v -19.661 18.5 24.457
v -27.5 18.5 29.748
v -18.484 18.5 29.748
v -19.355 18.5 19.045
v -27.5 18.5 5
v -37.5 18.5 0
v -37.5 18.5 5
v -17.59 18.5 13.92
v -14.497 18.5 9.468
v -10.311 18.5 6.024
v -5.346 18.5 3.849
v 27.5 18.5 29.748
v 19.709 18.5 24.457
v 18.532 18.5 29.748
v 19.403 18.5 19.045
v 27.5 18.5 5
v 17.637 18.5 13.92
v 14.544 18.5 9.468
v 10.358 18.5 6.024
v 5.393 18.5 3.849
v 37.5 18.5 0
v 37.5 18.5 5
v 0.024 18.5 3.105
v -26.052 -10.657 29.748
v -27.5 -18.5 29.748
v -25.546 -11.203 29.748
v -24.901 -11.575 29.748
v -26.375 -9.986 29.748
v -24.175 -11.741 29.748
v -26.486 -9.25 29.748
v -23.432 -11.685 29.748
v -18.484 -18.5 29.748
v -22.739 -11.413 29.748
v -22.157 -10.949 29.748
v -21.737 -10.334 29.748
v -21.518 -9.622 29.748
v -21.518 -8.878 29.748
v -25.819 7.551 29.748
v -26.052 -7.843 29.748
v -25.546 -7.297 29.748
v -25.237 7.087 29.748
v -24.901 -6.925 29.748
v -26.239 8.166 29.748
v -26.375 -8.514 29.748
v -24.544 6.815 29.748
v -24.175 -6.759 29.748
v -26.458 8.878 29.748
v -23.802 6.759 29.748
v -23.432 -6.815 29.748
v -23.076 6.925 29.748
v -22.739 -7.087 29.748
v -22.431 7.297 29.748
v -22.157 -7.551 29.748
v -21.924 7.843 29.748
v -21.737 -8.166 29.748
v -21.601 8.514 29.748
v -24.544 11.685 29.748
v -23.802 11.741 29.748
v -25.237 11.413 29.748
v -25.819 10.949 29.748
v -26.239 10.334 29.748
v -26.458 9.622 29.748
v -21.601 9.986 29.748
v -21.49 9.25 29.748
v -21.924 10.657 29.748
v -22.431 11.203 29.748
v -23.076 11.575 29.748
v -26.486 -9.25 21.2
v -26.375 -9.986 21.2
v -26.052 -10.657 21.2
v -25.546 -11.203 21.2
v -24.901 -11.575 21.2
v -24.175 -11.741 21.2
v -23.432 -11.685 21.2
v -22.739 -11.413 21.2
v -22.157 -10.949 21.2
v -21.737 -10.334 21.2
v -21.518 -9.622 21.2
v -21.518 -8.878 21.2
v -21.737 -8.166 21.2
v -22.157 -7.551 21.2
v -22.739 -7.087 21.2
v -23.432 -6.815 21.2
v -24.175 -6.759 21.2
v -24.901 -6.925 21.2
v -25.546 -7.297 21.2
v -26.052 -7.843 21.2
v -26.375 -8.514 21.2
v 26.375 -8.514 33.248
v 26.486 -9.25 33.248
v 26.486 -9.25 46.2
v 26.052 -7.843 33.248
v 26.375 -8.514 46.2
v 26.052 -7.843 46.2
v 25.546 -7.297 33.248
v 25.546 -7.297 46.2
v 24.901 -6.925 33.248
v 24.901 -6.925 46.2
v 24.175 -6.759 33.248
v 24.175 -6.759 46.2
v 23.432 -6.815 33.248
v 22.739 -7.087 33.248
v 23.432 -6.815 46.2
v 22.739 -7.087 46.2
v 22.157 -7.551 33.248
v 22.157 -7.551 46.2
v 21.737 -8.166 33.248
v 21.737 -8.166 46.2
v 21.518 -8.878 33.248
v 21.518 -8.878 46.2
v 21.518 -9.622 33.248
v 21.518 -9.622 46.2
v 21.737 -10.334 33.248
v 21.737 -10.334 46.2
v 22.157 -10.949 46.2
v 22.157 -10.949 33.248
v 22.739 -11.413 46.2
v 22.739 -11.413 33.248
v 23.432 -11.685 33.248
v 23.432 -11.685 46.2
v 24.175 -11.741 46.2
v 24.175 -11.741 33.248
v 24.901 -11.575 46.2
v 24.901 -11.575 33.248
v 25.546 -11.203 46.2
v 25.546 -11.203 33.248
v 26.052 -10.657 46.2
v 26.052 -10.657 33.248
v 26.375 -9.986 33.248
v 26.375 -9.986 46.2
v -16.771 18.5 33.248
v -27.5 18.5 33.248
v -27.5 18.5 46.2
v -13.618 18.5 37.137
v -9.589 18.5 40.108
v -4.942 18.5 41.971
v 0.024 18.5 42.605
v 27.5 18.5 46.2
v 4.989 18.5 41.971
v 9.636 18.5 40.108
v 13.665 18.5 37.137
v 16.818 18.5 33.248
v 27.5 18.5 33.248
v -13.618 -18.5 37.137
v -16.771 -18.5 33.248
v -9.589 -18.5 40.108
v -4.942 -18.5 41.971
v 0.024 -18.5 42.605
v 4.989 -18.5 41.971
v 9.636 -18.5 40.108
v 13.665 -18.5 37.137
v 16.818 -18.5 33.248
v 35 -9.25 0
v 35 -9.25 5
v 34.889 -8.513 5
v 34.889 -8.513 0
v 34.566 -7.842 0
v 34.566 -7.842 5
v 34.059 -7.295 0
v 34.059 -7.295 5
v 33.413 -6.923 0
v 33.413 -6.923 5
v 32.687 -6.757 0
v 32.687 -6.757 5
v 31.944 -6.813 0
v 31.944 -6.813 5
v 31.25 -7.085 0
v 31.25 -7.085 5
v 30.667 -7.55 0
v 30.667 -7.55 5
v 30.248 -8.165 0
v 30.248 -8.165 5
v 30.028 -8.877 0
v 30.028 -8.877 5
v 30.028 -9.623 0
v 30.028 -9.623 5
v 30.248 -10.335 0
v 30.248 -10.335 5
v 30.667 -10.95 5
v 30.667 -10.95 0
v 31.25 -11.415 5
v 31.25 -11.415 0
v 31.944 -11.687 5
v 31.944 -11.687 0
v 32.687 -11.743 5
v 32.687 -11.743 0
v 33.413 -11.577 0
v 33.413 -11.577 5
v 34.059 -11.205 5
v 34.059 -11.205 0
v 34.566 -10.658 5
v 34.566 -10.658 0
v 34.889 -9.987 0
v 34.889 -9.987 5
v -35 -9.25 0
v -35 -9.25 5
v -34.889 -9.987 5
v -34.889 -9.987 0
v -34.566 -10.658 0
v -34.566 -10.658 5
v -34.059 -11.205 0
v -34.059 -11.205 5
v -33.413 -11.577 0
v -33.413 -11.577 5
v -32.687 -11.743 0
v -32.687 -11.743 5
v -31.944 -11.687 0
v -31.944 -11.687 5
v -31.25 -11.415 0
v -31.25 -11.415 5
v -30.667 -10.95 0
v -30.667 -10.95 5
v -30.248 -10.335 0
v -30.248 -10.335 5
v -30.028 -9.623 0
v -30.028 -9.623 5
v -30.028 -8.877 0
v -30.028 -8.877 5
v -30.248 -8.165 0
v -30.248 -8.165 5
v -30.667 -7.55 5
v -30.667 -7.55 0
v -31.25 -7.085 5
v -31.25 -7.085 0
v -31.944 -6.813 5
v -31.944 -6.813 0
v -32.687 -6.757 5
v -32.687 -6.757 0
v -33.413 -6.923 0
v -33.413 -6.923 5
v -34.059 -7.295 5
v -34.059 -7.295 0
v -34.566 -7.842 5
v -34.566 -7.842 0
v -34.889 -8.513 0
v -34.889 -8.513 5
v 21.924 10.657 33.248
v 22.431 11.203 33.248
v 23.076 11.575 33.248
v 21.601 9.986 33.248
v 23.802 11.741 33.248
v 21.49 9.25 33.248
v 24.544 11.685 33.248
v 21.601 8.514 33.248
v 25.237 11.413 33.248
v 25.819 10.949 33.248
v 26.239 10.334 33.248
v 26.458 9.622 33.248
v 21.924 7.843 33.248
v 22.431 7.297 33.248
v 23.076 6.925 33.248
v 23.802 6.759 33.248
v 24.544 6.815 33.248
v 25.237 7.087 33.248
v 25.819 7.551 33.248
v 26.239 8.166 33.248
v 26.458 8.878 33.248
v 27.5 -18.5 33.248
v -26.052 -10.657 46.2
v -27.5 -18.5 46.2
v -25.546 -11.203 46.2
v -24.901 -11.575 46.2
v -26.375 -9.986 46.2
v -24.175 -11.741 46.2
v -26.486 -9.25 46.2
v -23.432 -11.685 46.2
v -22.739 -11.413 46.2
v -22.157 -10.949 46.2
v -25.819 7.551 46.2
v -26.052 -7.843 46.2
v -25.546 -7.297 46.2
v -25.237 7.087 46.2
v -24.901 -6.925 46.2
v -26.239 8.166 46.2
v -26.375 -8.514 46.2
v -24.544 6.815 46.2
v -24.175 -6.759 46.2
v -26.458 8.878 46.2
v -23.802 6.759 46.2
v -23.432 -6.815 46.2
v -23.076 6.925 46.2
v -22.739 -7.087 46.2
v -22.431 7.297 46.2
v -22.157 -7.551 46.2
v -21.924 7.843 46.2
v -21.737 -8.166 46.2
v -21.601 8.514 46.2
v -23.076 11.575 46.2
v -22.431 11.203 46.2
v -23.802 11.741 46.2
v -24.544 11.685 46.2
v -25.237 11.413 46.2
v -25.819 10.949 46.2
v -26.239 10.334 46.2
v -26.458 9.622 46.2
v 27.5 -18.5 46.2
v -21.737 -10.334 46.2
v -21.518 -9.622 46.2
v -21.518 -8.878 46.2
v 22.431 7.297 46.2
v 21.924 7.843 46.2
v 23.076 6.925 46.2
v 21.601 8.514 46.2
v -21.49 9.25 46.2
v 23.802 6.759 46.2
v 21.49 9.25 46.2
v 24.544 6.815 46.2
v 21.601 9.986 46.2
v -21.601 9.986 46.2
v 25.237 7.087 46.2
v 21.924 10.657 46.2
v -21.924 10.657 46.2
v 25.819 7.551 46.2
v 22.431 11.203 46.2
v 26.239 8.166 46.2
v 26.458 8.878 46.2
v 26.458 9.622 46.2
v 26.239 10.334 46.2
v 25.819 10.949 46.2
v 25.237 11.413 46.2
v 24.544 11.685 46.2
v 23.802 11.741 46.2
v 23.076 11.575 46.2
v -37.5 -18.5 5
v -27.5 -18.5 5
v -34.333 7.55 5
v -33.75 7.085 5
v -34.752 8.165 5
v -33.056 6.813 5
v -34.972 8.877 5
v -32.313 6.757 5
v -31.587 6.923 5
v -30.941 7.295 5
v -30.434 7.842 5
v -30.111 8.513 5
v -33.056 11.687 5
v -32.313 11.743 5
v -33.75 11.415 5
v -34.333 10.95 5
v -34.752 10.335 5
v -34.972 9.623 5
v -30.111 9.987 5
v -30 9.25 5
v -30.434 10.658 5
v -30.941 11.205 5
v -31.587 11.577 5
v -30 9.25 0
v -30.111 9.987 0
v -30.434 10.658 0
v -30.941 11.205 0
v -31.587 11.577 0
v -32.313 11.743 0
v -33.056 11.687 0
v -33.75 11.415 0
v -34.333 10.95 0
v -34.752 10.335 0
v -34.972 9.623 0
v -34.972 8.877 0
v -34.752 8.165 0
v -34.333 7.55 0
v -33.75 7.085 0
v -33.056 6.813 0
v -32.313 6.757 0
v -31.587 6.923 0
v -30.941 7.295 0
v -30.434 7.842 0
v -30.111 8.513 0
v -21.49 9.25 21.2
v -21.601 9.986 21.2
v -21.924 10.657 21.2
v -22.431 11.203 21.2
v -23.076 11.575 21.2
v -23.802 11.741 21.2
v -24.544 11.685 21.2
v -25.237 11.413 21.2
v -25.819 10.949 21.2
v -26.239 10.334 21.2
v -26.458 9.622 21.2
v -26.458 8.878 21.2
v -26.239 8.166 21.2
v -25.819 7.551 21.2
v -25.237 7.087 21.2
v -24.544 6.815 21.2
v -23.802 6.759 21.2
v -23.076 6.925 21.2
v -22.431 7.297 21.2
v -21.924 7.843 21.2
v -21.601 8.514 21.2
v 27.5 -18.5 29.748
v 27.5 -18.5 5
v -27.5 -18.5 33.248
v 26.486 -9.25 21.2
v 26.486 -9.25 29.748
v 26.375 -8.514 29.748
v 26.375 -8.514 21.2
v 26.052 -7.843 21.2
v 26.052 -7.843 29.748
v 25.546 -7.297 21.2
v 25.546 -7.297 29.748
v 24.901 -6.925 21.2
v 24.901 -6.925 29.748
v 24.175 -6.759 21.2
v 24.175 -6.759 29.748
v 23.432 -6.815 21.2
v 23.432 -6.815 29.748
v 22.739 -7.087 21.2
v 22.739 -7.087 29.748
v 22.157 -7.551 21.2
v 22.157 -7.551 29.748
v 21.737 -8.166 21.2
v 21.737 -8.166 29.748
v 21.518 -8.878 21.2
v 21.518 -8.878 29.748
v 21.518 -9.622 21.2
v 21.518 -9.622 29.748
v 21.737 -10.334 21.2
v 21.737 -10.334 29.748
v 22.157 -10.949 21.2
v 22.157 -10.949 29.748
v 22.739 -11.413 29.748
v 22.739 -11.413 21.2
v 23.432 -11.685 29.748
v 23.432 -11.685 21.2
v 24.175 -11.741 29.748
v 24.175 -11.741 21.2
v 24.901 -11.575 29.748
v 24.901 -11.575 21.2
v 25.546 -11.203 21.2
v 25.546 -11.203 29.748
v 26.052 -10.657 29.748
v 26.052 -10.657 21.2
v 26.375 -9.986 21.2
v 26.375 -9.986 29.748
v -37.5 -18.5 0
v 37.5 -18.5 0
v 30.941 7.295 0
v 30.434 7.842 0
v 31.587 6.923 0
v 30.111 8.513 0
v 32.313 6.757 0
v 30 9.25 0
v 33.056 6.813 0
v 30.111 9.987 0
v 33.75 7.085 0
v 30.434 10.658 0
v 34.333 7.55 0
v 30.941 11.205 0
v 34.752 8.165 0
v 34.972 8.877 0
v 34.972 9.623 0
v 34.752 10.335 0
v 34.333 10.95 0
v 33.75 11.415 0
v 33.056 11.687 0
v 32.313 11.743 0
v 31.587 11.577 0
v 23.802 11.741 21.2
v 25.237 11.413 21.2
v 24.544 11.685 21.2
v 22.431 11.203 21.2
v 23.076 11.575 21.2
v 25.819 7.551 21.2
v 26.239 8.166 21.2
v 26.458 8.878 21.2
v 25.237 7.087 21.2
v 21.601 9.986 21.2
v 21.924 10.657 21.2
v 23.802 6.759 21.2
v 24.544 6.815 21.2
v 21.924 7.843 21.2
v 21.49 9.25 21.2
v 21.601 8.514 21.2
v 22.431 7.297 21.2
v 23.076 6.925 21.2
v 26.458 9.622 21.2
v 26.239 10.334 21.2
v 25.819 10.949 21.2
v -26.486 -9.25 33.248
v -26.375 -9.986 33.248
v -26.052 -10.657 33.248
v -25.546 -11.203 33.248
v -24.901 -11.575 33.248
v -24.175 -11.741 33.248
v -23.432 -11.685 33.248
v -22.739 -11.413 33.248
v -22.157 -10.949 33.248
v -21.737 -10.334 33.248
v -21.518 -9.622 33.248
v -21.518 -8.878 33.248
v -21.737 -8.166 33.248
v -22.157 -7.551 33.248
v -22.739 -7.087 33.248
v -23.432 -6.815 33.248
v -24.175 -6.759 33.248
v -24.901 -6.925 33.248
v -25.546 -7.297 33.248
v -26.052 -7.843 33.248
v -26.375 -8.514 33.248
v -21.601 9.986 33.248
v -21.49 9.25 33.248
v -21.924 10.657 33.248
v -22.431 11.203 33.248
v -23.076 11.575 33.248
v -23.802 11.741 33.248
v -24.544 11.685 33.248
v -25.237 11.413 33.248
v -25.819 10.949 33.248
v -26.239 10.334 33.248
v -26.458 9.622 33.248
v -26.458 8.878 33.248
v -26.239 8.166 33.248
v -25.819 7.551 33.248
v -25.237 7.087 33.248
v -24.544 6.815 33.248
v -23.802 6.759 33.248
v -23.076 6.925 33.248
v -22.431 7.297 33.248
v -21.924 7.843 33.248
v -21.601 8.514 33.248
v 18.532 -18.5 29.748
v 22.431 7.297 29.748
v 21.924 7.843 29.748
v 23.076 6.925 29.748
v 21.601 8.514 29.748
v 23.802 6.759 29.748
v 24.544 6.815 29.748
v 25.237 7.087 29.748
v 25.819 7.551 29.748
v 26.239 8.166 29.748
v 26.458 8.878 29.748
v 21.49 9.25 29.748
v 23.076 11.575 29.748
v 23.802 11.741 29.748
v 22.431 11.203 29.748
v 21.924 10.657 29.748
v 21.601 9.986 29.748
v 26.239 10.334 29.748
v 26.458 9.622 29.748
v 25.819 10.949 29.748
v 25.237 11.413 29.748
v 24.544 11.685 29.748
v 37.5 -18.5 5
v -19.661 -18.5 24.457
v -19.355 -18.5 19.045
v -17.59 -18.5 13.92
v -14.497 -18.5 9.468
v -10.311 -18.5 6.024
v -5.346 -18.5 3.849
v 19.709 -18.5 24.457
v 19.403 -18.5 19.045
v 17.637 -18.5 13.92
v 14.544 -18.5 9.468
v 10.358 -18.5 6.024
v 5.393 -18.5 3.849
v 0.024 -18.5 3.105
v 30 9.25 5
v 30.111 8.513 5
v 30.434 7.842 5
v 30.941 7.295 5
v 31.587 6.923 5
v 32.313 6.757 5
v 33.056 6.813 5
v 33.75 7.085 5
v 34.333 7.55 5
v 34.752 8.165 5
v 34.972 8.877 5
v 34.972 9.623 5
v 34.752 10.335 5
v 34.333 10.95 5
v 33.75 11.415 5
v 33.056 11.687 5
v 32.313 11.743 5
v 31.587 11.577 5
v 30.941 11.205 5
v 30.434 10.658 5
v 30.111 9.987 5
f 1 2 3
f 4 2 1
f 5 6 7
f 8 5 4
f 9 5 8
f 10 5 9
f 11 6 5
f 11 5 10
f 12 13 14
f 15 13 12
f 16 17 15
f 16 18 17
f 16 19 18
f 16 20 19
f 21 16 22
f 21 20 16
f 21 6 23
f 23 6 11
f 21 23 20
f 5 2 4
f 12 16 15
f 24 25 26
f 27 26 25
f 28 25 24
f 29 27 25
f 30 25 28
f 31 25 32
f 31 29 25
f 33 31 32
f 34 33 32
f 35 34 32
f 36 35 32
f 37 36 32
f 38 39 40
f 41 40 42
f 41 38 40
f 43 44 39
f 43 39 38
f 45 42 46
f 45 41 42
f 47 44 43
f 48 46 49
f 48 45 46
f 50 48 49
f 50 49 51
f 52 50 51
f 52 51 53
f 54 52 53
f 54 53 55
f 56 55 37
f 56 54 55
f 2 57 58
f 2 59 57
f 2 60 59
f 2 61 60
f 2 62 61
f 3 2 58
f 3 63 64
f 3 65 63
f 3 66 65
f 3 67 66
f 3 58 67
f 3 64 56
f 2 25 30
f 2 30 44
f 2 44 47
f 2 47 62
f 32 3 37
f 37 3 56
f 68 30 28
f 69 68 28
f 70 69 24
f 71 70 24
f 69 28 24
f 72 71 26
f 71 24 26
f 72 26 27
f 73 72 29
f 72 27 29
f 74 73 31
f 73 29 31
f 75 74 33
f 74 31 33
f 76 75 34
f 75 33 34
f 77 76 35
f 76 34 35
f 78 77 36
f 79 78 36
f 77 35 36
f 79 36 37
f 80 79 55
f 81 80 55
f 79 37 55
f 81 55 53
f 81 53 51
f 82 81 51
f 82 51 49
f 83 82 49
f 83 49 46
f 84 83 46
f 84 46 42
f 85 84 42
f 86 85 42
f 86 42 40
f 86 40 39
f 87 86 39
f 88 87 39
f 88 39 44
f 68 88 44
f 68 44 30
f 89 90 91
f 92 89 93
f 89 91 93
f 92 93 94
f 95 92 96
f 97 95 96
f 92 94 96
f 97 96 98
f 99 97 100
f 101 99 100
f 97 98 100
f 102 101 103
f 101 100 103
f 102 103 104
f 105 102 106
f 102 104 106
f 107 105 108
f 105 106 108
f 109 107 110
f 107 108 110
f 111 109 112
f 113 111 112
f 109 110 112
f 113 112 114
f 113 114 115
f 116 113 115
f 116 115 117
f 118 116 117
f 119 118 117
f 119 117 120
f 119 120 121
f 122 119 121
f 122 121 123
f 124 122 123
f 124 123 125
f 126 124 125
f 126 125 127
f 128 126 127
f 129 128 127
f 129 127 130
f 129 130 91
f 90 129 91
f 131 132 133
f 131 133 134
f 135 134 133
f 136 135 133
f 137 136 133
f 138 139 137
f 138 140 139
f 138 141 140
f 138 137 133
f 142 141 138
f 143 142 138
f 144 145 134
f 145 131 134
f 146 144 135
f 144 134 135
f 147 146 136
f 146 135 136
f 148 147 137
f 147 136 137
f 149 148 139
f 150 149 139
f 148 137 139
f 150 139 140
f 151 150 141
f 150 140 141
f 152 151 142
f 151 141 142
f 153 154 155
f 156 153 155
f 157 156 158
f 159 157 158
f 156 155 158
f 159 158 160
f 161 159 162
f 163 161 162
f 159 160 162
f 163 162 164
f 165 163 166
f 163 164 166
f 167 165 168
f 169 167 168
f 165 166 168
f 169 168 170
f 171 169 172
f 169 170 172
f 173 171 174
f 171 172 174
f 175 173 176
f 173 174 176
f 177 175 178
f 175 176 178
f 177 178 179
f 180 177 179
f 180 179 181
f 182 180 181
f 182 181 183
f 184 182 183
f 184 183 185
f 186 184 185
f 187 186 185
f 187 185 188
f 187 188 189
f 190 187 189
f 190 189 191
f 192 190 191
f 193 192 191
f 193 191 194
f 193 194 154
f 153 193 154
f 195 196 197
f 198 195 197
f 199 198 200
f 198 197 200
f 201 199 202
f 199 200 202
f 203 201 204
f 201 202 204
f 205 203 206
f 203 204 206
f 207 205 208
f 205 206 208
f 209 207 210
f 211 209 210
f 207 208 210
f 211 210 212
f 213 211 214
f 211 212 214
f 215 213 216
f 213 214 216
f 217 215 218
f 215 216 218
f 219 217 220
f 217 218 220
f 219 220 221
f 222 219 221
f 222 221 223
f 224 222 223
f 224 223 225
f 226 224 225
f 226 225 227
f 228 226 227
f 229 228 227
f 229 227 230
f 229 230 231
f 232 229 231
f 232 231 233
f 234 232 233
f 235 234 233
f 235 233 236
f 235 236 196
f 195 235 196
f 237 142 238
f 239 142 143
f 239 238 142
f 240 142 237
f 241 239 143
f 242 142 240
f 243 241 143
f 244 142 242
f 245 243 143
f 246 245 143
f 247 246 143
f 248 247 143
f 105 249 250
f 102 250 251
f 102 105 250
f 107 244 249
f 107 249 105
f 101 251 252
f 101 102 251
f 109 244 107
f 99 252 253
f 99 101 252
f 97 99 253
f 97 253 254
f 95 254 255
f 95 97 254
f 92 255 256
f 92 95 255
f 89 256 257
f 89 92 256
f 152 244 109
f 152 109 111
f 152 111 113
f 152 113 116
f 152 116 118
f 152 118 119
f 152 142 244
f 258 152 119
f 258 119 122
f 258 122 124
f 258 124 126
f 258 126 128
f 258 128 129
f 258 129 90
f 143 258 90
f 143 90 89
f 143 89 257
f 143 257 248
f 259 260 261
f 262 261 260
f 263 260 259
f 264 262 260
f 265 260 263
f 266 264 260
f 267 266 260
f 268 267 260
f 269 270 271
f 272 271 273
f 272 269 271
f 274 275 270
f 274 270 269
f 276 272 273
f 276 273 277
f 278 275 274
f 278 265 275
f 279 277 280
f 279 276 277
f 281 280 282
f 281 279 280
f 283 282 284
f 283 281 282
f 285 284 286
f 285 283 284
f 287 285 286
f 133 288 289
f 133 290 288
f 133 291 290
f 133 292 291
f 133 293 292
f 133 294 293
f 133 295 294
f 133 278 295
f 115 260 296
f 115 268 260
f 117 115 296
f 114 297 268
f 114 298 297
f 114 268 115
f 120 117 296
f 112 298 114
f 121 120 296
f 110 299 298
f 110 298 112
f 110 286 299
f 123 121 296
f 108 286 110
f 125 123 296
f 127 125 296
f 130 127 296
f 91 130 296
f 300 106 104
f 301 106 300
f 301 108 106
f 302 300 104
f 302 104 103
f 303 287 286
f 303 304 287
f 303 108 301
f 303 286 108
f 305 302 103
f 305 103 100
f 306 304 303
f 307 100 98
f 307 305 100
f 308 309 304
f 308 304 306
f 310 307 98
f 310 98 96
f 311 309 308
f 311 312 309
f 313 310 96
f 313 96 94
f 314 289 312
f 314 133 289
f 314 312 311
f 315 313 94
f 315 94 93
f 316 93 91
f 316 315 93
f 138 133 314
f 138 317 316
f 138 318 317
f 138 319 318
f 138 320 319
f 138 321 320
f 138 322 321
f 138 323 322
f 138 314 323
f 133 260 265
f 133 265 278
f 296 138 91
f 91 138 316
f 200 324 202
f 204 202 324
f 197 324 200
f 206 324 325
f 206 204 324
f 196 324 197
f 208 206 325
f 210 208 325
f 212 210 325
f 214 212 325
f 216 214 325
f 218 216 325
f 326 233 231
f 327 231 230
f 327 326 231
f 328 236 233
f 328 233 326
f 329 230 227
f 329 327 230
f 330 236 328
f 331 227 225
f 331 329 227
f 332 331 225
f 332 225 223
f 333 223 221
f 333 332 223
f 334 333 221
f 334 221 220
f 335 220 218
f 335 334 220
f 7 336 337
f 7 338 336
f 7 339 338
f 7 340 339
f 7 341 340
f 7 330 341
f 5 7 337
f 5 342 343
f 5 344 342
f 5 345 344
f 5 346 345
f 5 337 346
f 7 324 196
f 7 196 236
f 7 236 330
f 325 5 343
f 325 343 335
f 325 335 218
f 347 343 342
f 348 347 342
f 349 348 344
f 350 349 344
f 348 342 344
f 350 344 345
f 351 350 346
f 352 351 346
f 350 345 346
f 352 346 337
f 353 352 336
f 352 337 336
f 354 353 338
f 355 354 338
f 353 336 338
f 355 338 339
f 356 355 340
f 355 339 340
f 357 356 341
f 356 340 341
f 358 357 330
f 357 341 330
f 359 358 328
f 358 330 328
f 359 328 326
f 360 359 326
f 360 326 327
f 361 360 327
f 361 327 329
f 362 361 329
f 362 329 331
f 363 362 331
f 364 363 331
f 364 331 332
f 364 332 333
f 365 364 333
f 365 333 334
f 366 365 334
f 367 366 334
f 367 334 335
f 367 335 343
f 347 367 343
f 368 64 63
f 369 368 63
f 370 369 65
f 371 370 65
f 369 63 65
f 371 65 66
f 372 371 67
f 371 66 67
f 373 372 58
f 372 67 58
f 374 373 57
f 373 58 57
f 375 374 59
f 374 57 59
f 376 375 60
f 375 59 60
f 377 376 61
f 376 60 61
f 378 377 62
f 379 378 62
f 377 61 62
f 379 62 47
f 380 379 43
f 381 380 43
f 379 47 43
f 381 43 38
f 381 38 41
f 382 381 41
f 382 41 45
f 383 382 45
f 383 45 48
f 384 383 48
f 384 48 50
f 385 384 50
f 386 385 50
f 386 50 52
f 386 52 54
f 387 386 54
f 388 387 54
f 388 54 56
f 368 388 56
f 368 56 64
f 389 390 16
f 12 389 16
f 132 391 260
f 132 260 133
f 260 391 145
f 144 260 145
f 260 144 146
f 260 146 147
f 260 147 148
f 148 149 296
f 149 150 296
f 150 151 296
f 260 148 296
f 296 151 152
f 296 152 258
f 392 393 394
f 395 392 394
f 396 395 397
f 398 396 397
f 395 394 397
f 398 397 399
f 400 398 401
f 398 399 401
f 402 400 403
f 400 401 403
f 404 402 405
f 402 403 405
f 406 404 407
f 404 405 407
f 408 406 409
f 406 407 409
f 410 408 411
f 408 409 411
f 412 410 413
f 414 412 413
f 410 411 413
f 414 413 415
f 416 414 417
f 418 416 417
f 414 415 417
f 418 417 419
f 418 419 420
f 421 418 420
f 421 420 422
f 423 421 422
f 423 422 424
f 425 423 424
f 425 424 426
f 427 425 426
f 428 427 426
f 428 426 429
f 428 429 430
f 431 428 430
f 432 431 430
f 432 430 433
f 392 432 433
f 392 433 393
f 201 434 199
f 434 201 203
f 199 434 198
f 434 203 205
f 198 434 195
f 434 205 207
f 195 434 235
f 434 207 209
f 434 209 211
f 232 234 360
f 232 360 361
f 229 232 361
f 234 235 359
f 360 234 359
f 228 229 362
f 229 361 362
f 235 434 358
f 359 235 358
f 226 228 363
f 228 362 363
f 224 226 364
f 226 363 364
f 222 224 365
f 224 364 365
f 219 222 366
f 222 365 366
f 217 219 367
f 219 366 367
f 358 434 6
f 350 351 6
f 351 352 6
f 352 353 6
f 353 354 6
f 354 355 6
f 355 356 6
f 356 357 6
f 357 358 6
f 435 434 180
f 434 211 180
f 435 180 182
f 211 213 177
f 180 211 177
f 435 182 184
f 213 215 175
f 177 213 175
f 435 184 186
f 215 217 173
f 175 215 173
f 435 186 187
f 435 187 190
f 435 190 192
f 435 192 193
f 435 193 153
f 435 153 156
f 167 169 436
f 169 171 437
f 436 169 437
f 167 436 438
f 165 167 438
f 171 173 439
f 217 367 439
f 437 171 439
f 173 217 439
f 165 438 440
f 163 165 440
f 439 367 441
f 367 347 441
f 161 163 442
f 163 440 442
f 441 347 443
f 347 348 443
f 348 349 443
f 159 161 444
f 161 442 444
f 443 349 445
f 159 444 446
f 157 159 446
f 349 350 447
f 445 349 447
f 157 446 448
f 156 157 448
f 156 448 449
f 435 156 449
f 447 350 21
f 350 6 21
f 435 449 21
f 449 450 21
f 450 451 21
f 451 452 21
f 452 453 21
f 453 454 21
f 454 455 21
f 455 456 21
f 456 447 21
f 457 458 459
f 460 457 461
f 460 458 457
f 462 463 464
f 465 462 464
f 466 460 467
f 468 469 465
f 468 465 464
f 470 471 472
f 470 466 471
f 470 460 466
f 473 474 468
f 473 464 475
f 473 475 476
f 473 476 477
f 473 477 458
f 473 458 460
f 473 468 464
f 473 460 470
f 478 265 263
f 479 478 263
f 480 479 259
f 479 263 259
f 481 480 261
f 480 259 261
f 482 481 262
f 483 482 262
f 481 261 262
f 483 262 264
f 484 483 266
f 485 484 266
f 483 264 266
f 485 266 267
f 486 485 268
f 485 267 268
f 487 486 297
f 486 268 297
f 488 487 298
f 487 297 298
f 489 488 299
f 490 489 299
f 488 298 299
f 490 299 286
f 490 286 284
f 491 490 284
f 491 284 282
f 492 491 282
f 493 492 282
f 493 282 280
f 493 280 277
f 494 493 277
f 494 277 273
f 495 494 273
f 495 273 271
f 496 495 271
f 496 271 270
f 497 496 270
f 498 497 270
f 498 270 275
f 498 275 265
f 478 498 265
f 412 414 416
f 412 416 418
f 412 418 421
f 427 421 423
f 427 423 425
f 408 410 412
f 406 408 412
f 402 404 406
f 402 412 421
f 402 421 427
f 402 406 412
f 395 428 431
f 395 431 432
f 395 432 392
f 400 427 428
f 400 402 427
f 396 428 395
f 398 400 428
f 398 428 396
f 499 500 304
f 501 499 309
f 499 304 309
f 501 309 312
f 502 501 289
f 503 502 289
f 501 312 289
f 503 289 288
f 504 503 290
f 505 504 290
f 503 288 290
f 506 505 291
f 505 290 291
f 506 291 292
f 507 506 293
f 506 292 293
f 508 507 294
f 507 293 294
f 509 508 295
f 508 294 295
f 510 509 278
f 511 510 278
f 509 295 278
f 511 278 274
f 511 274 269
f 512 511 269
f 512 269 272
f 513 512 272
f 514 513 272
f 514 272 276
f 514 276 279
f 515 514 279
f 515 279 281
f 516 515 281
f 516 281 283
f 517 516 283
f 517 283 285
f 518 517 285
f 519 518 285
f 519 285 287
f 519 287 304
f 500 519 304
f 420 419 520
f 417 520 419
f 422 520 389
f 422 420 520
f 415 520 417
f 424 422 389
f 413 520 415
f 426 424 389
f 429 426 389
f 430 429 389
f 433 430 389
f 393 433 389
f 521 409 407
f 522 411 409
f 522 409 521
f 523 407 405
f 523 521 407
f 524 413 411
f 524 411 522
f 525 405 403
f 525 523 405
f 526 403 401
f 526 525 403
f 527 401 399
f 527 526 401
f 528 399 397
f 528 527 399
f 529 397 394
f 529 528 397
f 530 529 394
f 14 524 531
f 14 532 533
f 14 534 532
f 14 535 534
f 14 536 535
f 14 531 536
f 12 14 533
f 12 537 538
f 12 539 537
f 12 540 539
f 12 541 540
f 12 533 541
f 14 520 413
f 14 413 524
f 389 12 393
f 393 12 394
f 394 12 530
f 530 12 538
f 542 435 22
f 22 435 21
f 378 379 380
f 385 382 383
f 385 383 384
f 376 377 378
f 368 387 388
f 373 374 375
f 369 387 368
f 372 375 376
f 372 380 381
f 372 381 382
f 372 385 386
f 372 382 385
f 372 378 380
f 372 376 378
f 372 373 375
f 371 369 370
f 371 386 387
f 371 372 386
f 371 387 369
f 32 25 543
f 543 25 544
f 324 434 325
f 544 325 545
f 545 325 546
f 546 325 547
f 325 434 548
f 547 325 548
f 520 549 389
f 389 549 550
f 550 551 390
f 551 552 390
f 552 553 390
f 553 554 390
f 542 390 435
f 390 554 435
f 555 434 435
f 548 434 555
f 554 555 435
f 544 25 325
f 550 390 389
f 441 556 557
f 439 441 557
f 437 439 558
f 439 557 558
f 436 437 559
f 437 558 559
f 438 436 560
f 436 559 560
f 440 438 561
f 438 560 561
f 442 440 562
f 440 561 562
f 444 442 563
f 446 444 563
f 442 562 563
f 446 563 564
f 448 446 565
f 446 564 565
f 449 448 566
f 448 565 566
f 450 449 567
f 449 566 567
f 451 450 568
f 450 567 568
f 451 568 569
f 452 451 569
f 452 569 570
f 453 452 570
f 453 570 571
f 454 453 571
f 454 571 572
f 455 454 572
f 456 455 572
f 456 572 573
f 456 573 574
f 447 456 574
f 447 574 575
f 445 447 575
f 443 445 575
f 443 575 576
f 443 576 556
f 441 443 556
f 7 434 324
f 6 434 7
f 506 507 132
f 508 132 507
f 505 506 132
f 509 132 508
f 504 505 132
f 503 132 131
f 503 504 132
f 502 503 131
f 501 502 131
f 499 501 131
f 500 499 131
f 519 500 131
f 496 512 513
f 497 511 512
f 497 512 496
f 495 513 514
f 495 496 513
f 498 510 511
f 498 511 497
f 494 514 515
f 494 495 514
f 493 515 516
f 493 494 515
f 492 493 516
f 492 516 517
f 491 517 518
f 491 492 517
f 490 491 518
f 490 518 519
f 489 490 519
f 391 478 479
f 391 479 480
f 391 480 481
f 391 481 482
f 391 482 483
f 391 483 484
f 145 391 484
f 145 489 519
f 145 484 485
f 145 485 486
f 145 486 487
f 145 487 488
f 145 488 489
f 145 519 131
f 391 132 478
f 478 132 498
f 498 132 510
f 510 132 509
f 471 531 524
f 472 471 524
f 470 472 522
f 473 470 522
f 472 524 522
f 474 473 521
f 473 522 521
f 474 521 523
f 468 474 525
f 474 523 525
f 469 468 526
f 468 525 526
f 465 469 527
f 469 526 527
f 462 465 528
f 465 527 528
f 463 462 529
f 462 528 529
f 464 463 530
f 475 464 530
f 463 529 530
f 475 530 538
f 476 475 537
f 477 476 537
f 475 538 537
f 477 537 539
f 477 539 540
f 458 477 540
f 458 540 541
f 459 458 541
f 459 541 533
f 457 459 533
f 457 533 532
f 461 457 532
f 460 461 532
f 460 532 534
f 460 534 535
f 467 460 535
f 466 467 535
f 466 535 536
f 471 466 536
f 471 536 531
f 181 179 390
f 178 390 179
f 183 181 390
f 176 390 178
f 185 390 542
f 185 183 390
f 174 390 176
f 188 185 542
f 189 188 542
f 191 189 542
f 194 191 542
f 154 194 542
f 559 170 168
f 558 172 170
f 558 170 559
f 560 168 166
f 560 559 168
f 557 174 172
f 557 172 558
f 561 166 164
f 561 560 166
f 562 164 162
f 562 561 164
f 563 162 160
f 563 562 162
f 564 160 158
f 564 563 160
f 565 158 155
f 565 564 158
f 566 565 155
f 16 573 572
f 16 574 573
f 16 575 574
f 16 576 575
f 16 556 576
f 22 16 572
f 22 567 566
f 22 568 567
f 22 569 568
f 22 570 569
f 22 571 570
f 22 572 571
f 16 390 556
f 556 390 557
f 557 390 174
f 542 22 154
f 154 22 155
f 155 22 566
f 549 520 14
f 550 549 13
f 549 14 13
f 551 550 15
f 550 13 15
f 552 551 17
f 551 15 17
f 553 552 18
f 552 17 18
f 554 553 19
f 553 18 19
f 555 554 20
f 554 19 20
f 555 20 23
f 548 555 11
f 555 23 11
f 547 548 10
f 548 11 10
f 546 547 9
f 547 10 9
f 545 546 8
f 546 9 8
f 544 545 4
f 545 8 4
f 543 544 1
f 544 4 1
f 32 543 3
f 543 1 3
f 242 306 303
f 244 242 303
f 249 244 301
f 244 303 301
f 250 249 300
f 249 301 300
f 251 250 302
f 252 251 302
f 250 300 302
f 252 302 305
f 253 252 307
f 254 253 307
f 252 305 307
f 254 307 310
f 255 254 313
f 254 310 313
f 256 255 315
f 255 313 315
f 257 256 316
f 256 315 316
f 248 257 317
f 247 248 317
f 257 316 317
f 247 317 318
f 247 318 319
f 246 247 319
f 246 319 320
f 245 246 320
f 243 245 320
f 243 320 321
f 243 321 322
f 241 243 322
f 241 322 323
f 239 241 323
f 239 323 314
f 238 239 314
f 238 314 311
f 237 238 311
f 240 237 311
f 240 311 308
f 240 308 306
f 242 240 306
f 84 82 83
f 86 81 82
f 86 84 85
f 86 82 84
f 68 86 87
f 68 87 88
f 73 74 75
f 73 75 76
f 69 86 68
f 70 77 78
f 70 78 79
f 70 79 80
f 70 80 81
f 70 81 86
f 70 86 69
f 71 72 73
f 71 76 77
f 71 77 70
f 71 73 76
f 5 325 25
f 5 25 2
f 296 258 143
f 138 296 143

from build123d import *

# Parameters (mm, degrees)
SKETCH1_W              = 75
SKETCH1_H              = 37
BOSS_EXTRUDE1_DEPTH    = 5
SKETCH19_W             = 55
SKETCH19_H             = 37
BOSS_EXTRUDE5_DEPTH    = 41.2
SKETCH20_R             = 19.75
CUT_EXTRUDE7_DEPTH     = 71.069180101
SKETCH22_R             = 2.498129319
CUT_EXTRUDE8_DEPTH     = 25
SPLIT1_SURFACE_1_BACK  = 96.543
SPLIT1_SURFACE_1_DEPTH = 193.086
SPLIT1_SURFACE_2_BACK  = 96.543
SPLIT1_SURFACE_2_DEPTH = 193.086
SKETCH23_R             = 2.5
CUT_EXTRUDE9_DEPTH     = 59.702129433
SKETCH24_W             = 55
SKETCH24_H             = 3.5
CUT_EXTRUDE10_DEPTH    = 71.069180101


with BuildPart() as part:
    # Sketch1 → Boss-Extrude1 (new body)
    with BuildSketch(Plane.XY):
        Rectangle(SKETCH1_W, SKETCH1_H)
    extrude(amount=BOSS_EXTRUDE1_DEPTH)

    # Sketch19 → Boss-Extrude5 (add)
    with BuildSketch(Plane.XY.offset(5)):
        Rectangle(SKETCH19_W, SKETCH19_H)
    extrude(amount=BOSS_EXTRUDE5_DEPTH)

    # Sketch20 → Cut-Extrude7 (cut, through all)
    with BuildSketch(Plane(origin=(0, 18.5, 0), x_dir=(1, 0, 0), z_dir=(0, 1, 0))):
        with Locations(Location((0.023568345, -22.855008575, 0), (0, 0, 270))):
            Circle(SKETCH20_R)
    extrude(amount=-CUT_EXTRUDE7_DEPTH, mode=Mode.SUBTRACT)

    # Sketch22 → Cut-Extrude8 (cut)
    with BuildSketch(Plane.XY.offset(46.2)):
        with Locations((-23.988215828, 9.25)):
            Circle(SKETCH22_R)
        with Locations(Location((-23.988215828, -9.25, 0), (0, 0, 180))):
            Circle(SKETCH22_R)
        with Locations((23.988215828, -9.25)):
            Circle(SKETCH22_R)
        with Locations(Location((23.988215828, 9.25, 0), (0, 0, 180))):
            Circle(SKETCH22_R)
    extrude(amount=-CUT_EXTRUDE8_DEPTH, mode=Mode.SUBTRACT)


with BuildPart() as body_2:
    # Split1: the piece behind the surface
    add(part.part)
    # Split1 surface: a surface, the sketch's curves swept straight by 193.086 mm
    with BuildLine(Plane(origin=(0, 18.5, 0), x_dir=(1, 0, 0), z_dir=(0, 1, 0)).offset(-SPLIT1_SURFACE_1_BACK), mode=Mode.PRIVATE) as split1_surface_1_path:
        Line((-27.5, -33.248134685), (27.5, -33.248134685))
    split1_surface_1 = Shell.extrude(split1_surface_1_path.wire(), (0 * SPLIT1_SURFACE_1_DEPTH, 1 * SPLIT1_SURFACE_1_DEPTH, 0 * SPLIT1_SURFACE_1_DEPTH))
    split(bisect_by=split1_surface_1, keep=Keep.BOTTOM)


with BuildPart() as part_1:
    add(part.part)

    # Split1: split by a surface, the side it looks to stays
    # Split1 surface: a surface, the sketch's curves swept straight by 193.086 mm
    with BuildLine(Plane(origin=(0, 18.5, 0), x_dir=(1, 0, 0), z_dir=(0, 1, 0)).offset(-SPLIT1_SURFACE_2_BACK), mode=Mode.PRIVATE) as split1_surface_2_path:
        Line((-27.5, -33.248134685), (27.5, -33.248134685))
    split1_surface_2 = Shell.extrude(split1_surface_2_path.wire(), (0 * SPLIT1_SURFACE_2_DEPTH, 1 * SPLIT1_SURFACE_2_DEPTH, 0 * SPLIT1_SURFACE_2_DEPTH))
    split(bisect_by=split1_surface_2, keep=Keep.TOP)

    # Sketch23 → Cut-Extrude9 (cut, through all)
    with BuildSketch(Plane.XY.offset(5)):
        with Locations((32.5, -9.25)):
            Circle(SKETCH23_R)
        with Locations(Location((32.5, 9.25, 0), (0, 0, 180))):
            Circle(SKETCH23_R)
        with Locations(Location((-32.5, -9.25, 0), (0, 0, 180))):
            Circle(SKETCH23_R)
        with Locations((-32.5, 9.25)):
            Circle(SKETCH23_R)
    extrude(amount=-CUT_EXTRUDE9_DEPTH, mode=Mode.SUBTRACT)

    # Sketch24 → Cut-Extrude10 (cut, through all)
    with BuildSketch(Plane(origin=(0, 18.5, 0), x_dir=(1, 0, 0), z_dir=(0, 1, 0))):
        with Locations((0, -31.498134685)):
            Rectangle(SKETCH24_W, SKETCH24_H)
    extrude(amount=-CUT_EXTRUDE10_DEPTH, mode=Mode.SUBTRACT)


solid = Compound([body_2.part, part_1.part])
